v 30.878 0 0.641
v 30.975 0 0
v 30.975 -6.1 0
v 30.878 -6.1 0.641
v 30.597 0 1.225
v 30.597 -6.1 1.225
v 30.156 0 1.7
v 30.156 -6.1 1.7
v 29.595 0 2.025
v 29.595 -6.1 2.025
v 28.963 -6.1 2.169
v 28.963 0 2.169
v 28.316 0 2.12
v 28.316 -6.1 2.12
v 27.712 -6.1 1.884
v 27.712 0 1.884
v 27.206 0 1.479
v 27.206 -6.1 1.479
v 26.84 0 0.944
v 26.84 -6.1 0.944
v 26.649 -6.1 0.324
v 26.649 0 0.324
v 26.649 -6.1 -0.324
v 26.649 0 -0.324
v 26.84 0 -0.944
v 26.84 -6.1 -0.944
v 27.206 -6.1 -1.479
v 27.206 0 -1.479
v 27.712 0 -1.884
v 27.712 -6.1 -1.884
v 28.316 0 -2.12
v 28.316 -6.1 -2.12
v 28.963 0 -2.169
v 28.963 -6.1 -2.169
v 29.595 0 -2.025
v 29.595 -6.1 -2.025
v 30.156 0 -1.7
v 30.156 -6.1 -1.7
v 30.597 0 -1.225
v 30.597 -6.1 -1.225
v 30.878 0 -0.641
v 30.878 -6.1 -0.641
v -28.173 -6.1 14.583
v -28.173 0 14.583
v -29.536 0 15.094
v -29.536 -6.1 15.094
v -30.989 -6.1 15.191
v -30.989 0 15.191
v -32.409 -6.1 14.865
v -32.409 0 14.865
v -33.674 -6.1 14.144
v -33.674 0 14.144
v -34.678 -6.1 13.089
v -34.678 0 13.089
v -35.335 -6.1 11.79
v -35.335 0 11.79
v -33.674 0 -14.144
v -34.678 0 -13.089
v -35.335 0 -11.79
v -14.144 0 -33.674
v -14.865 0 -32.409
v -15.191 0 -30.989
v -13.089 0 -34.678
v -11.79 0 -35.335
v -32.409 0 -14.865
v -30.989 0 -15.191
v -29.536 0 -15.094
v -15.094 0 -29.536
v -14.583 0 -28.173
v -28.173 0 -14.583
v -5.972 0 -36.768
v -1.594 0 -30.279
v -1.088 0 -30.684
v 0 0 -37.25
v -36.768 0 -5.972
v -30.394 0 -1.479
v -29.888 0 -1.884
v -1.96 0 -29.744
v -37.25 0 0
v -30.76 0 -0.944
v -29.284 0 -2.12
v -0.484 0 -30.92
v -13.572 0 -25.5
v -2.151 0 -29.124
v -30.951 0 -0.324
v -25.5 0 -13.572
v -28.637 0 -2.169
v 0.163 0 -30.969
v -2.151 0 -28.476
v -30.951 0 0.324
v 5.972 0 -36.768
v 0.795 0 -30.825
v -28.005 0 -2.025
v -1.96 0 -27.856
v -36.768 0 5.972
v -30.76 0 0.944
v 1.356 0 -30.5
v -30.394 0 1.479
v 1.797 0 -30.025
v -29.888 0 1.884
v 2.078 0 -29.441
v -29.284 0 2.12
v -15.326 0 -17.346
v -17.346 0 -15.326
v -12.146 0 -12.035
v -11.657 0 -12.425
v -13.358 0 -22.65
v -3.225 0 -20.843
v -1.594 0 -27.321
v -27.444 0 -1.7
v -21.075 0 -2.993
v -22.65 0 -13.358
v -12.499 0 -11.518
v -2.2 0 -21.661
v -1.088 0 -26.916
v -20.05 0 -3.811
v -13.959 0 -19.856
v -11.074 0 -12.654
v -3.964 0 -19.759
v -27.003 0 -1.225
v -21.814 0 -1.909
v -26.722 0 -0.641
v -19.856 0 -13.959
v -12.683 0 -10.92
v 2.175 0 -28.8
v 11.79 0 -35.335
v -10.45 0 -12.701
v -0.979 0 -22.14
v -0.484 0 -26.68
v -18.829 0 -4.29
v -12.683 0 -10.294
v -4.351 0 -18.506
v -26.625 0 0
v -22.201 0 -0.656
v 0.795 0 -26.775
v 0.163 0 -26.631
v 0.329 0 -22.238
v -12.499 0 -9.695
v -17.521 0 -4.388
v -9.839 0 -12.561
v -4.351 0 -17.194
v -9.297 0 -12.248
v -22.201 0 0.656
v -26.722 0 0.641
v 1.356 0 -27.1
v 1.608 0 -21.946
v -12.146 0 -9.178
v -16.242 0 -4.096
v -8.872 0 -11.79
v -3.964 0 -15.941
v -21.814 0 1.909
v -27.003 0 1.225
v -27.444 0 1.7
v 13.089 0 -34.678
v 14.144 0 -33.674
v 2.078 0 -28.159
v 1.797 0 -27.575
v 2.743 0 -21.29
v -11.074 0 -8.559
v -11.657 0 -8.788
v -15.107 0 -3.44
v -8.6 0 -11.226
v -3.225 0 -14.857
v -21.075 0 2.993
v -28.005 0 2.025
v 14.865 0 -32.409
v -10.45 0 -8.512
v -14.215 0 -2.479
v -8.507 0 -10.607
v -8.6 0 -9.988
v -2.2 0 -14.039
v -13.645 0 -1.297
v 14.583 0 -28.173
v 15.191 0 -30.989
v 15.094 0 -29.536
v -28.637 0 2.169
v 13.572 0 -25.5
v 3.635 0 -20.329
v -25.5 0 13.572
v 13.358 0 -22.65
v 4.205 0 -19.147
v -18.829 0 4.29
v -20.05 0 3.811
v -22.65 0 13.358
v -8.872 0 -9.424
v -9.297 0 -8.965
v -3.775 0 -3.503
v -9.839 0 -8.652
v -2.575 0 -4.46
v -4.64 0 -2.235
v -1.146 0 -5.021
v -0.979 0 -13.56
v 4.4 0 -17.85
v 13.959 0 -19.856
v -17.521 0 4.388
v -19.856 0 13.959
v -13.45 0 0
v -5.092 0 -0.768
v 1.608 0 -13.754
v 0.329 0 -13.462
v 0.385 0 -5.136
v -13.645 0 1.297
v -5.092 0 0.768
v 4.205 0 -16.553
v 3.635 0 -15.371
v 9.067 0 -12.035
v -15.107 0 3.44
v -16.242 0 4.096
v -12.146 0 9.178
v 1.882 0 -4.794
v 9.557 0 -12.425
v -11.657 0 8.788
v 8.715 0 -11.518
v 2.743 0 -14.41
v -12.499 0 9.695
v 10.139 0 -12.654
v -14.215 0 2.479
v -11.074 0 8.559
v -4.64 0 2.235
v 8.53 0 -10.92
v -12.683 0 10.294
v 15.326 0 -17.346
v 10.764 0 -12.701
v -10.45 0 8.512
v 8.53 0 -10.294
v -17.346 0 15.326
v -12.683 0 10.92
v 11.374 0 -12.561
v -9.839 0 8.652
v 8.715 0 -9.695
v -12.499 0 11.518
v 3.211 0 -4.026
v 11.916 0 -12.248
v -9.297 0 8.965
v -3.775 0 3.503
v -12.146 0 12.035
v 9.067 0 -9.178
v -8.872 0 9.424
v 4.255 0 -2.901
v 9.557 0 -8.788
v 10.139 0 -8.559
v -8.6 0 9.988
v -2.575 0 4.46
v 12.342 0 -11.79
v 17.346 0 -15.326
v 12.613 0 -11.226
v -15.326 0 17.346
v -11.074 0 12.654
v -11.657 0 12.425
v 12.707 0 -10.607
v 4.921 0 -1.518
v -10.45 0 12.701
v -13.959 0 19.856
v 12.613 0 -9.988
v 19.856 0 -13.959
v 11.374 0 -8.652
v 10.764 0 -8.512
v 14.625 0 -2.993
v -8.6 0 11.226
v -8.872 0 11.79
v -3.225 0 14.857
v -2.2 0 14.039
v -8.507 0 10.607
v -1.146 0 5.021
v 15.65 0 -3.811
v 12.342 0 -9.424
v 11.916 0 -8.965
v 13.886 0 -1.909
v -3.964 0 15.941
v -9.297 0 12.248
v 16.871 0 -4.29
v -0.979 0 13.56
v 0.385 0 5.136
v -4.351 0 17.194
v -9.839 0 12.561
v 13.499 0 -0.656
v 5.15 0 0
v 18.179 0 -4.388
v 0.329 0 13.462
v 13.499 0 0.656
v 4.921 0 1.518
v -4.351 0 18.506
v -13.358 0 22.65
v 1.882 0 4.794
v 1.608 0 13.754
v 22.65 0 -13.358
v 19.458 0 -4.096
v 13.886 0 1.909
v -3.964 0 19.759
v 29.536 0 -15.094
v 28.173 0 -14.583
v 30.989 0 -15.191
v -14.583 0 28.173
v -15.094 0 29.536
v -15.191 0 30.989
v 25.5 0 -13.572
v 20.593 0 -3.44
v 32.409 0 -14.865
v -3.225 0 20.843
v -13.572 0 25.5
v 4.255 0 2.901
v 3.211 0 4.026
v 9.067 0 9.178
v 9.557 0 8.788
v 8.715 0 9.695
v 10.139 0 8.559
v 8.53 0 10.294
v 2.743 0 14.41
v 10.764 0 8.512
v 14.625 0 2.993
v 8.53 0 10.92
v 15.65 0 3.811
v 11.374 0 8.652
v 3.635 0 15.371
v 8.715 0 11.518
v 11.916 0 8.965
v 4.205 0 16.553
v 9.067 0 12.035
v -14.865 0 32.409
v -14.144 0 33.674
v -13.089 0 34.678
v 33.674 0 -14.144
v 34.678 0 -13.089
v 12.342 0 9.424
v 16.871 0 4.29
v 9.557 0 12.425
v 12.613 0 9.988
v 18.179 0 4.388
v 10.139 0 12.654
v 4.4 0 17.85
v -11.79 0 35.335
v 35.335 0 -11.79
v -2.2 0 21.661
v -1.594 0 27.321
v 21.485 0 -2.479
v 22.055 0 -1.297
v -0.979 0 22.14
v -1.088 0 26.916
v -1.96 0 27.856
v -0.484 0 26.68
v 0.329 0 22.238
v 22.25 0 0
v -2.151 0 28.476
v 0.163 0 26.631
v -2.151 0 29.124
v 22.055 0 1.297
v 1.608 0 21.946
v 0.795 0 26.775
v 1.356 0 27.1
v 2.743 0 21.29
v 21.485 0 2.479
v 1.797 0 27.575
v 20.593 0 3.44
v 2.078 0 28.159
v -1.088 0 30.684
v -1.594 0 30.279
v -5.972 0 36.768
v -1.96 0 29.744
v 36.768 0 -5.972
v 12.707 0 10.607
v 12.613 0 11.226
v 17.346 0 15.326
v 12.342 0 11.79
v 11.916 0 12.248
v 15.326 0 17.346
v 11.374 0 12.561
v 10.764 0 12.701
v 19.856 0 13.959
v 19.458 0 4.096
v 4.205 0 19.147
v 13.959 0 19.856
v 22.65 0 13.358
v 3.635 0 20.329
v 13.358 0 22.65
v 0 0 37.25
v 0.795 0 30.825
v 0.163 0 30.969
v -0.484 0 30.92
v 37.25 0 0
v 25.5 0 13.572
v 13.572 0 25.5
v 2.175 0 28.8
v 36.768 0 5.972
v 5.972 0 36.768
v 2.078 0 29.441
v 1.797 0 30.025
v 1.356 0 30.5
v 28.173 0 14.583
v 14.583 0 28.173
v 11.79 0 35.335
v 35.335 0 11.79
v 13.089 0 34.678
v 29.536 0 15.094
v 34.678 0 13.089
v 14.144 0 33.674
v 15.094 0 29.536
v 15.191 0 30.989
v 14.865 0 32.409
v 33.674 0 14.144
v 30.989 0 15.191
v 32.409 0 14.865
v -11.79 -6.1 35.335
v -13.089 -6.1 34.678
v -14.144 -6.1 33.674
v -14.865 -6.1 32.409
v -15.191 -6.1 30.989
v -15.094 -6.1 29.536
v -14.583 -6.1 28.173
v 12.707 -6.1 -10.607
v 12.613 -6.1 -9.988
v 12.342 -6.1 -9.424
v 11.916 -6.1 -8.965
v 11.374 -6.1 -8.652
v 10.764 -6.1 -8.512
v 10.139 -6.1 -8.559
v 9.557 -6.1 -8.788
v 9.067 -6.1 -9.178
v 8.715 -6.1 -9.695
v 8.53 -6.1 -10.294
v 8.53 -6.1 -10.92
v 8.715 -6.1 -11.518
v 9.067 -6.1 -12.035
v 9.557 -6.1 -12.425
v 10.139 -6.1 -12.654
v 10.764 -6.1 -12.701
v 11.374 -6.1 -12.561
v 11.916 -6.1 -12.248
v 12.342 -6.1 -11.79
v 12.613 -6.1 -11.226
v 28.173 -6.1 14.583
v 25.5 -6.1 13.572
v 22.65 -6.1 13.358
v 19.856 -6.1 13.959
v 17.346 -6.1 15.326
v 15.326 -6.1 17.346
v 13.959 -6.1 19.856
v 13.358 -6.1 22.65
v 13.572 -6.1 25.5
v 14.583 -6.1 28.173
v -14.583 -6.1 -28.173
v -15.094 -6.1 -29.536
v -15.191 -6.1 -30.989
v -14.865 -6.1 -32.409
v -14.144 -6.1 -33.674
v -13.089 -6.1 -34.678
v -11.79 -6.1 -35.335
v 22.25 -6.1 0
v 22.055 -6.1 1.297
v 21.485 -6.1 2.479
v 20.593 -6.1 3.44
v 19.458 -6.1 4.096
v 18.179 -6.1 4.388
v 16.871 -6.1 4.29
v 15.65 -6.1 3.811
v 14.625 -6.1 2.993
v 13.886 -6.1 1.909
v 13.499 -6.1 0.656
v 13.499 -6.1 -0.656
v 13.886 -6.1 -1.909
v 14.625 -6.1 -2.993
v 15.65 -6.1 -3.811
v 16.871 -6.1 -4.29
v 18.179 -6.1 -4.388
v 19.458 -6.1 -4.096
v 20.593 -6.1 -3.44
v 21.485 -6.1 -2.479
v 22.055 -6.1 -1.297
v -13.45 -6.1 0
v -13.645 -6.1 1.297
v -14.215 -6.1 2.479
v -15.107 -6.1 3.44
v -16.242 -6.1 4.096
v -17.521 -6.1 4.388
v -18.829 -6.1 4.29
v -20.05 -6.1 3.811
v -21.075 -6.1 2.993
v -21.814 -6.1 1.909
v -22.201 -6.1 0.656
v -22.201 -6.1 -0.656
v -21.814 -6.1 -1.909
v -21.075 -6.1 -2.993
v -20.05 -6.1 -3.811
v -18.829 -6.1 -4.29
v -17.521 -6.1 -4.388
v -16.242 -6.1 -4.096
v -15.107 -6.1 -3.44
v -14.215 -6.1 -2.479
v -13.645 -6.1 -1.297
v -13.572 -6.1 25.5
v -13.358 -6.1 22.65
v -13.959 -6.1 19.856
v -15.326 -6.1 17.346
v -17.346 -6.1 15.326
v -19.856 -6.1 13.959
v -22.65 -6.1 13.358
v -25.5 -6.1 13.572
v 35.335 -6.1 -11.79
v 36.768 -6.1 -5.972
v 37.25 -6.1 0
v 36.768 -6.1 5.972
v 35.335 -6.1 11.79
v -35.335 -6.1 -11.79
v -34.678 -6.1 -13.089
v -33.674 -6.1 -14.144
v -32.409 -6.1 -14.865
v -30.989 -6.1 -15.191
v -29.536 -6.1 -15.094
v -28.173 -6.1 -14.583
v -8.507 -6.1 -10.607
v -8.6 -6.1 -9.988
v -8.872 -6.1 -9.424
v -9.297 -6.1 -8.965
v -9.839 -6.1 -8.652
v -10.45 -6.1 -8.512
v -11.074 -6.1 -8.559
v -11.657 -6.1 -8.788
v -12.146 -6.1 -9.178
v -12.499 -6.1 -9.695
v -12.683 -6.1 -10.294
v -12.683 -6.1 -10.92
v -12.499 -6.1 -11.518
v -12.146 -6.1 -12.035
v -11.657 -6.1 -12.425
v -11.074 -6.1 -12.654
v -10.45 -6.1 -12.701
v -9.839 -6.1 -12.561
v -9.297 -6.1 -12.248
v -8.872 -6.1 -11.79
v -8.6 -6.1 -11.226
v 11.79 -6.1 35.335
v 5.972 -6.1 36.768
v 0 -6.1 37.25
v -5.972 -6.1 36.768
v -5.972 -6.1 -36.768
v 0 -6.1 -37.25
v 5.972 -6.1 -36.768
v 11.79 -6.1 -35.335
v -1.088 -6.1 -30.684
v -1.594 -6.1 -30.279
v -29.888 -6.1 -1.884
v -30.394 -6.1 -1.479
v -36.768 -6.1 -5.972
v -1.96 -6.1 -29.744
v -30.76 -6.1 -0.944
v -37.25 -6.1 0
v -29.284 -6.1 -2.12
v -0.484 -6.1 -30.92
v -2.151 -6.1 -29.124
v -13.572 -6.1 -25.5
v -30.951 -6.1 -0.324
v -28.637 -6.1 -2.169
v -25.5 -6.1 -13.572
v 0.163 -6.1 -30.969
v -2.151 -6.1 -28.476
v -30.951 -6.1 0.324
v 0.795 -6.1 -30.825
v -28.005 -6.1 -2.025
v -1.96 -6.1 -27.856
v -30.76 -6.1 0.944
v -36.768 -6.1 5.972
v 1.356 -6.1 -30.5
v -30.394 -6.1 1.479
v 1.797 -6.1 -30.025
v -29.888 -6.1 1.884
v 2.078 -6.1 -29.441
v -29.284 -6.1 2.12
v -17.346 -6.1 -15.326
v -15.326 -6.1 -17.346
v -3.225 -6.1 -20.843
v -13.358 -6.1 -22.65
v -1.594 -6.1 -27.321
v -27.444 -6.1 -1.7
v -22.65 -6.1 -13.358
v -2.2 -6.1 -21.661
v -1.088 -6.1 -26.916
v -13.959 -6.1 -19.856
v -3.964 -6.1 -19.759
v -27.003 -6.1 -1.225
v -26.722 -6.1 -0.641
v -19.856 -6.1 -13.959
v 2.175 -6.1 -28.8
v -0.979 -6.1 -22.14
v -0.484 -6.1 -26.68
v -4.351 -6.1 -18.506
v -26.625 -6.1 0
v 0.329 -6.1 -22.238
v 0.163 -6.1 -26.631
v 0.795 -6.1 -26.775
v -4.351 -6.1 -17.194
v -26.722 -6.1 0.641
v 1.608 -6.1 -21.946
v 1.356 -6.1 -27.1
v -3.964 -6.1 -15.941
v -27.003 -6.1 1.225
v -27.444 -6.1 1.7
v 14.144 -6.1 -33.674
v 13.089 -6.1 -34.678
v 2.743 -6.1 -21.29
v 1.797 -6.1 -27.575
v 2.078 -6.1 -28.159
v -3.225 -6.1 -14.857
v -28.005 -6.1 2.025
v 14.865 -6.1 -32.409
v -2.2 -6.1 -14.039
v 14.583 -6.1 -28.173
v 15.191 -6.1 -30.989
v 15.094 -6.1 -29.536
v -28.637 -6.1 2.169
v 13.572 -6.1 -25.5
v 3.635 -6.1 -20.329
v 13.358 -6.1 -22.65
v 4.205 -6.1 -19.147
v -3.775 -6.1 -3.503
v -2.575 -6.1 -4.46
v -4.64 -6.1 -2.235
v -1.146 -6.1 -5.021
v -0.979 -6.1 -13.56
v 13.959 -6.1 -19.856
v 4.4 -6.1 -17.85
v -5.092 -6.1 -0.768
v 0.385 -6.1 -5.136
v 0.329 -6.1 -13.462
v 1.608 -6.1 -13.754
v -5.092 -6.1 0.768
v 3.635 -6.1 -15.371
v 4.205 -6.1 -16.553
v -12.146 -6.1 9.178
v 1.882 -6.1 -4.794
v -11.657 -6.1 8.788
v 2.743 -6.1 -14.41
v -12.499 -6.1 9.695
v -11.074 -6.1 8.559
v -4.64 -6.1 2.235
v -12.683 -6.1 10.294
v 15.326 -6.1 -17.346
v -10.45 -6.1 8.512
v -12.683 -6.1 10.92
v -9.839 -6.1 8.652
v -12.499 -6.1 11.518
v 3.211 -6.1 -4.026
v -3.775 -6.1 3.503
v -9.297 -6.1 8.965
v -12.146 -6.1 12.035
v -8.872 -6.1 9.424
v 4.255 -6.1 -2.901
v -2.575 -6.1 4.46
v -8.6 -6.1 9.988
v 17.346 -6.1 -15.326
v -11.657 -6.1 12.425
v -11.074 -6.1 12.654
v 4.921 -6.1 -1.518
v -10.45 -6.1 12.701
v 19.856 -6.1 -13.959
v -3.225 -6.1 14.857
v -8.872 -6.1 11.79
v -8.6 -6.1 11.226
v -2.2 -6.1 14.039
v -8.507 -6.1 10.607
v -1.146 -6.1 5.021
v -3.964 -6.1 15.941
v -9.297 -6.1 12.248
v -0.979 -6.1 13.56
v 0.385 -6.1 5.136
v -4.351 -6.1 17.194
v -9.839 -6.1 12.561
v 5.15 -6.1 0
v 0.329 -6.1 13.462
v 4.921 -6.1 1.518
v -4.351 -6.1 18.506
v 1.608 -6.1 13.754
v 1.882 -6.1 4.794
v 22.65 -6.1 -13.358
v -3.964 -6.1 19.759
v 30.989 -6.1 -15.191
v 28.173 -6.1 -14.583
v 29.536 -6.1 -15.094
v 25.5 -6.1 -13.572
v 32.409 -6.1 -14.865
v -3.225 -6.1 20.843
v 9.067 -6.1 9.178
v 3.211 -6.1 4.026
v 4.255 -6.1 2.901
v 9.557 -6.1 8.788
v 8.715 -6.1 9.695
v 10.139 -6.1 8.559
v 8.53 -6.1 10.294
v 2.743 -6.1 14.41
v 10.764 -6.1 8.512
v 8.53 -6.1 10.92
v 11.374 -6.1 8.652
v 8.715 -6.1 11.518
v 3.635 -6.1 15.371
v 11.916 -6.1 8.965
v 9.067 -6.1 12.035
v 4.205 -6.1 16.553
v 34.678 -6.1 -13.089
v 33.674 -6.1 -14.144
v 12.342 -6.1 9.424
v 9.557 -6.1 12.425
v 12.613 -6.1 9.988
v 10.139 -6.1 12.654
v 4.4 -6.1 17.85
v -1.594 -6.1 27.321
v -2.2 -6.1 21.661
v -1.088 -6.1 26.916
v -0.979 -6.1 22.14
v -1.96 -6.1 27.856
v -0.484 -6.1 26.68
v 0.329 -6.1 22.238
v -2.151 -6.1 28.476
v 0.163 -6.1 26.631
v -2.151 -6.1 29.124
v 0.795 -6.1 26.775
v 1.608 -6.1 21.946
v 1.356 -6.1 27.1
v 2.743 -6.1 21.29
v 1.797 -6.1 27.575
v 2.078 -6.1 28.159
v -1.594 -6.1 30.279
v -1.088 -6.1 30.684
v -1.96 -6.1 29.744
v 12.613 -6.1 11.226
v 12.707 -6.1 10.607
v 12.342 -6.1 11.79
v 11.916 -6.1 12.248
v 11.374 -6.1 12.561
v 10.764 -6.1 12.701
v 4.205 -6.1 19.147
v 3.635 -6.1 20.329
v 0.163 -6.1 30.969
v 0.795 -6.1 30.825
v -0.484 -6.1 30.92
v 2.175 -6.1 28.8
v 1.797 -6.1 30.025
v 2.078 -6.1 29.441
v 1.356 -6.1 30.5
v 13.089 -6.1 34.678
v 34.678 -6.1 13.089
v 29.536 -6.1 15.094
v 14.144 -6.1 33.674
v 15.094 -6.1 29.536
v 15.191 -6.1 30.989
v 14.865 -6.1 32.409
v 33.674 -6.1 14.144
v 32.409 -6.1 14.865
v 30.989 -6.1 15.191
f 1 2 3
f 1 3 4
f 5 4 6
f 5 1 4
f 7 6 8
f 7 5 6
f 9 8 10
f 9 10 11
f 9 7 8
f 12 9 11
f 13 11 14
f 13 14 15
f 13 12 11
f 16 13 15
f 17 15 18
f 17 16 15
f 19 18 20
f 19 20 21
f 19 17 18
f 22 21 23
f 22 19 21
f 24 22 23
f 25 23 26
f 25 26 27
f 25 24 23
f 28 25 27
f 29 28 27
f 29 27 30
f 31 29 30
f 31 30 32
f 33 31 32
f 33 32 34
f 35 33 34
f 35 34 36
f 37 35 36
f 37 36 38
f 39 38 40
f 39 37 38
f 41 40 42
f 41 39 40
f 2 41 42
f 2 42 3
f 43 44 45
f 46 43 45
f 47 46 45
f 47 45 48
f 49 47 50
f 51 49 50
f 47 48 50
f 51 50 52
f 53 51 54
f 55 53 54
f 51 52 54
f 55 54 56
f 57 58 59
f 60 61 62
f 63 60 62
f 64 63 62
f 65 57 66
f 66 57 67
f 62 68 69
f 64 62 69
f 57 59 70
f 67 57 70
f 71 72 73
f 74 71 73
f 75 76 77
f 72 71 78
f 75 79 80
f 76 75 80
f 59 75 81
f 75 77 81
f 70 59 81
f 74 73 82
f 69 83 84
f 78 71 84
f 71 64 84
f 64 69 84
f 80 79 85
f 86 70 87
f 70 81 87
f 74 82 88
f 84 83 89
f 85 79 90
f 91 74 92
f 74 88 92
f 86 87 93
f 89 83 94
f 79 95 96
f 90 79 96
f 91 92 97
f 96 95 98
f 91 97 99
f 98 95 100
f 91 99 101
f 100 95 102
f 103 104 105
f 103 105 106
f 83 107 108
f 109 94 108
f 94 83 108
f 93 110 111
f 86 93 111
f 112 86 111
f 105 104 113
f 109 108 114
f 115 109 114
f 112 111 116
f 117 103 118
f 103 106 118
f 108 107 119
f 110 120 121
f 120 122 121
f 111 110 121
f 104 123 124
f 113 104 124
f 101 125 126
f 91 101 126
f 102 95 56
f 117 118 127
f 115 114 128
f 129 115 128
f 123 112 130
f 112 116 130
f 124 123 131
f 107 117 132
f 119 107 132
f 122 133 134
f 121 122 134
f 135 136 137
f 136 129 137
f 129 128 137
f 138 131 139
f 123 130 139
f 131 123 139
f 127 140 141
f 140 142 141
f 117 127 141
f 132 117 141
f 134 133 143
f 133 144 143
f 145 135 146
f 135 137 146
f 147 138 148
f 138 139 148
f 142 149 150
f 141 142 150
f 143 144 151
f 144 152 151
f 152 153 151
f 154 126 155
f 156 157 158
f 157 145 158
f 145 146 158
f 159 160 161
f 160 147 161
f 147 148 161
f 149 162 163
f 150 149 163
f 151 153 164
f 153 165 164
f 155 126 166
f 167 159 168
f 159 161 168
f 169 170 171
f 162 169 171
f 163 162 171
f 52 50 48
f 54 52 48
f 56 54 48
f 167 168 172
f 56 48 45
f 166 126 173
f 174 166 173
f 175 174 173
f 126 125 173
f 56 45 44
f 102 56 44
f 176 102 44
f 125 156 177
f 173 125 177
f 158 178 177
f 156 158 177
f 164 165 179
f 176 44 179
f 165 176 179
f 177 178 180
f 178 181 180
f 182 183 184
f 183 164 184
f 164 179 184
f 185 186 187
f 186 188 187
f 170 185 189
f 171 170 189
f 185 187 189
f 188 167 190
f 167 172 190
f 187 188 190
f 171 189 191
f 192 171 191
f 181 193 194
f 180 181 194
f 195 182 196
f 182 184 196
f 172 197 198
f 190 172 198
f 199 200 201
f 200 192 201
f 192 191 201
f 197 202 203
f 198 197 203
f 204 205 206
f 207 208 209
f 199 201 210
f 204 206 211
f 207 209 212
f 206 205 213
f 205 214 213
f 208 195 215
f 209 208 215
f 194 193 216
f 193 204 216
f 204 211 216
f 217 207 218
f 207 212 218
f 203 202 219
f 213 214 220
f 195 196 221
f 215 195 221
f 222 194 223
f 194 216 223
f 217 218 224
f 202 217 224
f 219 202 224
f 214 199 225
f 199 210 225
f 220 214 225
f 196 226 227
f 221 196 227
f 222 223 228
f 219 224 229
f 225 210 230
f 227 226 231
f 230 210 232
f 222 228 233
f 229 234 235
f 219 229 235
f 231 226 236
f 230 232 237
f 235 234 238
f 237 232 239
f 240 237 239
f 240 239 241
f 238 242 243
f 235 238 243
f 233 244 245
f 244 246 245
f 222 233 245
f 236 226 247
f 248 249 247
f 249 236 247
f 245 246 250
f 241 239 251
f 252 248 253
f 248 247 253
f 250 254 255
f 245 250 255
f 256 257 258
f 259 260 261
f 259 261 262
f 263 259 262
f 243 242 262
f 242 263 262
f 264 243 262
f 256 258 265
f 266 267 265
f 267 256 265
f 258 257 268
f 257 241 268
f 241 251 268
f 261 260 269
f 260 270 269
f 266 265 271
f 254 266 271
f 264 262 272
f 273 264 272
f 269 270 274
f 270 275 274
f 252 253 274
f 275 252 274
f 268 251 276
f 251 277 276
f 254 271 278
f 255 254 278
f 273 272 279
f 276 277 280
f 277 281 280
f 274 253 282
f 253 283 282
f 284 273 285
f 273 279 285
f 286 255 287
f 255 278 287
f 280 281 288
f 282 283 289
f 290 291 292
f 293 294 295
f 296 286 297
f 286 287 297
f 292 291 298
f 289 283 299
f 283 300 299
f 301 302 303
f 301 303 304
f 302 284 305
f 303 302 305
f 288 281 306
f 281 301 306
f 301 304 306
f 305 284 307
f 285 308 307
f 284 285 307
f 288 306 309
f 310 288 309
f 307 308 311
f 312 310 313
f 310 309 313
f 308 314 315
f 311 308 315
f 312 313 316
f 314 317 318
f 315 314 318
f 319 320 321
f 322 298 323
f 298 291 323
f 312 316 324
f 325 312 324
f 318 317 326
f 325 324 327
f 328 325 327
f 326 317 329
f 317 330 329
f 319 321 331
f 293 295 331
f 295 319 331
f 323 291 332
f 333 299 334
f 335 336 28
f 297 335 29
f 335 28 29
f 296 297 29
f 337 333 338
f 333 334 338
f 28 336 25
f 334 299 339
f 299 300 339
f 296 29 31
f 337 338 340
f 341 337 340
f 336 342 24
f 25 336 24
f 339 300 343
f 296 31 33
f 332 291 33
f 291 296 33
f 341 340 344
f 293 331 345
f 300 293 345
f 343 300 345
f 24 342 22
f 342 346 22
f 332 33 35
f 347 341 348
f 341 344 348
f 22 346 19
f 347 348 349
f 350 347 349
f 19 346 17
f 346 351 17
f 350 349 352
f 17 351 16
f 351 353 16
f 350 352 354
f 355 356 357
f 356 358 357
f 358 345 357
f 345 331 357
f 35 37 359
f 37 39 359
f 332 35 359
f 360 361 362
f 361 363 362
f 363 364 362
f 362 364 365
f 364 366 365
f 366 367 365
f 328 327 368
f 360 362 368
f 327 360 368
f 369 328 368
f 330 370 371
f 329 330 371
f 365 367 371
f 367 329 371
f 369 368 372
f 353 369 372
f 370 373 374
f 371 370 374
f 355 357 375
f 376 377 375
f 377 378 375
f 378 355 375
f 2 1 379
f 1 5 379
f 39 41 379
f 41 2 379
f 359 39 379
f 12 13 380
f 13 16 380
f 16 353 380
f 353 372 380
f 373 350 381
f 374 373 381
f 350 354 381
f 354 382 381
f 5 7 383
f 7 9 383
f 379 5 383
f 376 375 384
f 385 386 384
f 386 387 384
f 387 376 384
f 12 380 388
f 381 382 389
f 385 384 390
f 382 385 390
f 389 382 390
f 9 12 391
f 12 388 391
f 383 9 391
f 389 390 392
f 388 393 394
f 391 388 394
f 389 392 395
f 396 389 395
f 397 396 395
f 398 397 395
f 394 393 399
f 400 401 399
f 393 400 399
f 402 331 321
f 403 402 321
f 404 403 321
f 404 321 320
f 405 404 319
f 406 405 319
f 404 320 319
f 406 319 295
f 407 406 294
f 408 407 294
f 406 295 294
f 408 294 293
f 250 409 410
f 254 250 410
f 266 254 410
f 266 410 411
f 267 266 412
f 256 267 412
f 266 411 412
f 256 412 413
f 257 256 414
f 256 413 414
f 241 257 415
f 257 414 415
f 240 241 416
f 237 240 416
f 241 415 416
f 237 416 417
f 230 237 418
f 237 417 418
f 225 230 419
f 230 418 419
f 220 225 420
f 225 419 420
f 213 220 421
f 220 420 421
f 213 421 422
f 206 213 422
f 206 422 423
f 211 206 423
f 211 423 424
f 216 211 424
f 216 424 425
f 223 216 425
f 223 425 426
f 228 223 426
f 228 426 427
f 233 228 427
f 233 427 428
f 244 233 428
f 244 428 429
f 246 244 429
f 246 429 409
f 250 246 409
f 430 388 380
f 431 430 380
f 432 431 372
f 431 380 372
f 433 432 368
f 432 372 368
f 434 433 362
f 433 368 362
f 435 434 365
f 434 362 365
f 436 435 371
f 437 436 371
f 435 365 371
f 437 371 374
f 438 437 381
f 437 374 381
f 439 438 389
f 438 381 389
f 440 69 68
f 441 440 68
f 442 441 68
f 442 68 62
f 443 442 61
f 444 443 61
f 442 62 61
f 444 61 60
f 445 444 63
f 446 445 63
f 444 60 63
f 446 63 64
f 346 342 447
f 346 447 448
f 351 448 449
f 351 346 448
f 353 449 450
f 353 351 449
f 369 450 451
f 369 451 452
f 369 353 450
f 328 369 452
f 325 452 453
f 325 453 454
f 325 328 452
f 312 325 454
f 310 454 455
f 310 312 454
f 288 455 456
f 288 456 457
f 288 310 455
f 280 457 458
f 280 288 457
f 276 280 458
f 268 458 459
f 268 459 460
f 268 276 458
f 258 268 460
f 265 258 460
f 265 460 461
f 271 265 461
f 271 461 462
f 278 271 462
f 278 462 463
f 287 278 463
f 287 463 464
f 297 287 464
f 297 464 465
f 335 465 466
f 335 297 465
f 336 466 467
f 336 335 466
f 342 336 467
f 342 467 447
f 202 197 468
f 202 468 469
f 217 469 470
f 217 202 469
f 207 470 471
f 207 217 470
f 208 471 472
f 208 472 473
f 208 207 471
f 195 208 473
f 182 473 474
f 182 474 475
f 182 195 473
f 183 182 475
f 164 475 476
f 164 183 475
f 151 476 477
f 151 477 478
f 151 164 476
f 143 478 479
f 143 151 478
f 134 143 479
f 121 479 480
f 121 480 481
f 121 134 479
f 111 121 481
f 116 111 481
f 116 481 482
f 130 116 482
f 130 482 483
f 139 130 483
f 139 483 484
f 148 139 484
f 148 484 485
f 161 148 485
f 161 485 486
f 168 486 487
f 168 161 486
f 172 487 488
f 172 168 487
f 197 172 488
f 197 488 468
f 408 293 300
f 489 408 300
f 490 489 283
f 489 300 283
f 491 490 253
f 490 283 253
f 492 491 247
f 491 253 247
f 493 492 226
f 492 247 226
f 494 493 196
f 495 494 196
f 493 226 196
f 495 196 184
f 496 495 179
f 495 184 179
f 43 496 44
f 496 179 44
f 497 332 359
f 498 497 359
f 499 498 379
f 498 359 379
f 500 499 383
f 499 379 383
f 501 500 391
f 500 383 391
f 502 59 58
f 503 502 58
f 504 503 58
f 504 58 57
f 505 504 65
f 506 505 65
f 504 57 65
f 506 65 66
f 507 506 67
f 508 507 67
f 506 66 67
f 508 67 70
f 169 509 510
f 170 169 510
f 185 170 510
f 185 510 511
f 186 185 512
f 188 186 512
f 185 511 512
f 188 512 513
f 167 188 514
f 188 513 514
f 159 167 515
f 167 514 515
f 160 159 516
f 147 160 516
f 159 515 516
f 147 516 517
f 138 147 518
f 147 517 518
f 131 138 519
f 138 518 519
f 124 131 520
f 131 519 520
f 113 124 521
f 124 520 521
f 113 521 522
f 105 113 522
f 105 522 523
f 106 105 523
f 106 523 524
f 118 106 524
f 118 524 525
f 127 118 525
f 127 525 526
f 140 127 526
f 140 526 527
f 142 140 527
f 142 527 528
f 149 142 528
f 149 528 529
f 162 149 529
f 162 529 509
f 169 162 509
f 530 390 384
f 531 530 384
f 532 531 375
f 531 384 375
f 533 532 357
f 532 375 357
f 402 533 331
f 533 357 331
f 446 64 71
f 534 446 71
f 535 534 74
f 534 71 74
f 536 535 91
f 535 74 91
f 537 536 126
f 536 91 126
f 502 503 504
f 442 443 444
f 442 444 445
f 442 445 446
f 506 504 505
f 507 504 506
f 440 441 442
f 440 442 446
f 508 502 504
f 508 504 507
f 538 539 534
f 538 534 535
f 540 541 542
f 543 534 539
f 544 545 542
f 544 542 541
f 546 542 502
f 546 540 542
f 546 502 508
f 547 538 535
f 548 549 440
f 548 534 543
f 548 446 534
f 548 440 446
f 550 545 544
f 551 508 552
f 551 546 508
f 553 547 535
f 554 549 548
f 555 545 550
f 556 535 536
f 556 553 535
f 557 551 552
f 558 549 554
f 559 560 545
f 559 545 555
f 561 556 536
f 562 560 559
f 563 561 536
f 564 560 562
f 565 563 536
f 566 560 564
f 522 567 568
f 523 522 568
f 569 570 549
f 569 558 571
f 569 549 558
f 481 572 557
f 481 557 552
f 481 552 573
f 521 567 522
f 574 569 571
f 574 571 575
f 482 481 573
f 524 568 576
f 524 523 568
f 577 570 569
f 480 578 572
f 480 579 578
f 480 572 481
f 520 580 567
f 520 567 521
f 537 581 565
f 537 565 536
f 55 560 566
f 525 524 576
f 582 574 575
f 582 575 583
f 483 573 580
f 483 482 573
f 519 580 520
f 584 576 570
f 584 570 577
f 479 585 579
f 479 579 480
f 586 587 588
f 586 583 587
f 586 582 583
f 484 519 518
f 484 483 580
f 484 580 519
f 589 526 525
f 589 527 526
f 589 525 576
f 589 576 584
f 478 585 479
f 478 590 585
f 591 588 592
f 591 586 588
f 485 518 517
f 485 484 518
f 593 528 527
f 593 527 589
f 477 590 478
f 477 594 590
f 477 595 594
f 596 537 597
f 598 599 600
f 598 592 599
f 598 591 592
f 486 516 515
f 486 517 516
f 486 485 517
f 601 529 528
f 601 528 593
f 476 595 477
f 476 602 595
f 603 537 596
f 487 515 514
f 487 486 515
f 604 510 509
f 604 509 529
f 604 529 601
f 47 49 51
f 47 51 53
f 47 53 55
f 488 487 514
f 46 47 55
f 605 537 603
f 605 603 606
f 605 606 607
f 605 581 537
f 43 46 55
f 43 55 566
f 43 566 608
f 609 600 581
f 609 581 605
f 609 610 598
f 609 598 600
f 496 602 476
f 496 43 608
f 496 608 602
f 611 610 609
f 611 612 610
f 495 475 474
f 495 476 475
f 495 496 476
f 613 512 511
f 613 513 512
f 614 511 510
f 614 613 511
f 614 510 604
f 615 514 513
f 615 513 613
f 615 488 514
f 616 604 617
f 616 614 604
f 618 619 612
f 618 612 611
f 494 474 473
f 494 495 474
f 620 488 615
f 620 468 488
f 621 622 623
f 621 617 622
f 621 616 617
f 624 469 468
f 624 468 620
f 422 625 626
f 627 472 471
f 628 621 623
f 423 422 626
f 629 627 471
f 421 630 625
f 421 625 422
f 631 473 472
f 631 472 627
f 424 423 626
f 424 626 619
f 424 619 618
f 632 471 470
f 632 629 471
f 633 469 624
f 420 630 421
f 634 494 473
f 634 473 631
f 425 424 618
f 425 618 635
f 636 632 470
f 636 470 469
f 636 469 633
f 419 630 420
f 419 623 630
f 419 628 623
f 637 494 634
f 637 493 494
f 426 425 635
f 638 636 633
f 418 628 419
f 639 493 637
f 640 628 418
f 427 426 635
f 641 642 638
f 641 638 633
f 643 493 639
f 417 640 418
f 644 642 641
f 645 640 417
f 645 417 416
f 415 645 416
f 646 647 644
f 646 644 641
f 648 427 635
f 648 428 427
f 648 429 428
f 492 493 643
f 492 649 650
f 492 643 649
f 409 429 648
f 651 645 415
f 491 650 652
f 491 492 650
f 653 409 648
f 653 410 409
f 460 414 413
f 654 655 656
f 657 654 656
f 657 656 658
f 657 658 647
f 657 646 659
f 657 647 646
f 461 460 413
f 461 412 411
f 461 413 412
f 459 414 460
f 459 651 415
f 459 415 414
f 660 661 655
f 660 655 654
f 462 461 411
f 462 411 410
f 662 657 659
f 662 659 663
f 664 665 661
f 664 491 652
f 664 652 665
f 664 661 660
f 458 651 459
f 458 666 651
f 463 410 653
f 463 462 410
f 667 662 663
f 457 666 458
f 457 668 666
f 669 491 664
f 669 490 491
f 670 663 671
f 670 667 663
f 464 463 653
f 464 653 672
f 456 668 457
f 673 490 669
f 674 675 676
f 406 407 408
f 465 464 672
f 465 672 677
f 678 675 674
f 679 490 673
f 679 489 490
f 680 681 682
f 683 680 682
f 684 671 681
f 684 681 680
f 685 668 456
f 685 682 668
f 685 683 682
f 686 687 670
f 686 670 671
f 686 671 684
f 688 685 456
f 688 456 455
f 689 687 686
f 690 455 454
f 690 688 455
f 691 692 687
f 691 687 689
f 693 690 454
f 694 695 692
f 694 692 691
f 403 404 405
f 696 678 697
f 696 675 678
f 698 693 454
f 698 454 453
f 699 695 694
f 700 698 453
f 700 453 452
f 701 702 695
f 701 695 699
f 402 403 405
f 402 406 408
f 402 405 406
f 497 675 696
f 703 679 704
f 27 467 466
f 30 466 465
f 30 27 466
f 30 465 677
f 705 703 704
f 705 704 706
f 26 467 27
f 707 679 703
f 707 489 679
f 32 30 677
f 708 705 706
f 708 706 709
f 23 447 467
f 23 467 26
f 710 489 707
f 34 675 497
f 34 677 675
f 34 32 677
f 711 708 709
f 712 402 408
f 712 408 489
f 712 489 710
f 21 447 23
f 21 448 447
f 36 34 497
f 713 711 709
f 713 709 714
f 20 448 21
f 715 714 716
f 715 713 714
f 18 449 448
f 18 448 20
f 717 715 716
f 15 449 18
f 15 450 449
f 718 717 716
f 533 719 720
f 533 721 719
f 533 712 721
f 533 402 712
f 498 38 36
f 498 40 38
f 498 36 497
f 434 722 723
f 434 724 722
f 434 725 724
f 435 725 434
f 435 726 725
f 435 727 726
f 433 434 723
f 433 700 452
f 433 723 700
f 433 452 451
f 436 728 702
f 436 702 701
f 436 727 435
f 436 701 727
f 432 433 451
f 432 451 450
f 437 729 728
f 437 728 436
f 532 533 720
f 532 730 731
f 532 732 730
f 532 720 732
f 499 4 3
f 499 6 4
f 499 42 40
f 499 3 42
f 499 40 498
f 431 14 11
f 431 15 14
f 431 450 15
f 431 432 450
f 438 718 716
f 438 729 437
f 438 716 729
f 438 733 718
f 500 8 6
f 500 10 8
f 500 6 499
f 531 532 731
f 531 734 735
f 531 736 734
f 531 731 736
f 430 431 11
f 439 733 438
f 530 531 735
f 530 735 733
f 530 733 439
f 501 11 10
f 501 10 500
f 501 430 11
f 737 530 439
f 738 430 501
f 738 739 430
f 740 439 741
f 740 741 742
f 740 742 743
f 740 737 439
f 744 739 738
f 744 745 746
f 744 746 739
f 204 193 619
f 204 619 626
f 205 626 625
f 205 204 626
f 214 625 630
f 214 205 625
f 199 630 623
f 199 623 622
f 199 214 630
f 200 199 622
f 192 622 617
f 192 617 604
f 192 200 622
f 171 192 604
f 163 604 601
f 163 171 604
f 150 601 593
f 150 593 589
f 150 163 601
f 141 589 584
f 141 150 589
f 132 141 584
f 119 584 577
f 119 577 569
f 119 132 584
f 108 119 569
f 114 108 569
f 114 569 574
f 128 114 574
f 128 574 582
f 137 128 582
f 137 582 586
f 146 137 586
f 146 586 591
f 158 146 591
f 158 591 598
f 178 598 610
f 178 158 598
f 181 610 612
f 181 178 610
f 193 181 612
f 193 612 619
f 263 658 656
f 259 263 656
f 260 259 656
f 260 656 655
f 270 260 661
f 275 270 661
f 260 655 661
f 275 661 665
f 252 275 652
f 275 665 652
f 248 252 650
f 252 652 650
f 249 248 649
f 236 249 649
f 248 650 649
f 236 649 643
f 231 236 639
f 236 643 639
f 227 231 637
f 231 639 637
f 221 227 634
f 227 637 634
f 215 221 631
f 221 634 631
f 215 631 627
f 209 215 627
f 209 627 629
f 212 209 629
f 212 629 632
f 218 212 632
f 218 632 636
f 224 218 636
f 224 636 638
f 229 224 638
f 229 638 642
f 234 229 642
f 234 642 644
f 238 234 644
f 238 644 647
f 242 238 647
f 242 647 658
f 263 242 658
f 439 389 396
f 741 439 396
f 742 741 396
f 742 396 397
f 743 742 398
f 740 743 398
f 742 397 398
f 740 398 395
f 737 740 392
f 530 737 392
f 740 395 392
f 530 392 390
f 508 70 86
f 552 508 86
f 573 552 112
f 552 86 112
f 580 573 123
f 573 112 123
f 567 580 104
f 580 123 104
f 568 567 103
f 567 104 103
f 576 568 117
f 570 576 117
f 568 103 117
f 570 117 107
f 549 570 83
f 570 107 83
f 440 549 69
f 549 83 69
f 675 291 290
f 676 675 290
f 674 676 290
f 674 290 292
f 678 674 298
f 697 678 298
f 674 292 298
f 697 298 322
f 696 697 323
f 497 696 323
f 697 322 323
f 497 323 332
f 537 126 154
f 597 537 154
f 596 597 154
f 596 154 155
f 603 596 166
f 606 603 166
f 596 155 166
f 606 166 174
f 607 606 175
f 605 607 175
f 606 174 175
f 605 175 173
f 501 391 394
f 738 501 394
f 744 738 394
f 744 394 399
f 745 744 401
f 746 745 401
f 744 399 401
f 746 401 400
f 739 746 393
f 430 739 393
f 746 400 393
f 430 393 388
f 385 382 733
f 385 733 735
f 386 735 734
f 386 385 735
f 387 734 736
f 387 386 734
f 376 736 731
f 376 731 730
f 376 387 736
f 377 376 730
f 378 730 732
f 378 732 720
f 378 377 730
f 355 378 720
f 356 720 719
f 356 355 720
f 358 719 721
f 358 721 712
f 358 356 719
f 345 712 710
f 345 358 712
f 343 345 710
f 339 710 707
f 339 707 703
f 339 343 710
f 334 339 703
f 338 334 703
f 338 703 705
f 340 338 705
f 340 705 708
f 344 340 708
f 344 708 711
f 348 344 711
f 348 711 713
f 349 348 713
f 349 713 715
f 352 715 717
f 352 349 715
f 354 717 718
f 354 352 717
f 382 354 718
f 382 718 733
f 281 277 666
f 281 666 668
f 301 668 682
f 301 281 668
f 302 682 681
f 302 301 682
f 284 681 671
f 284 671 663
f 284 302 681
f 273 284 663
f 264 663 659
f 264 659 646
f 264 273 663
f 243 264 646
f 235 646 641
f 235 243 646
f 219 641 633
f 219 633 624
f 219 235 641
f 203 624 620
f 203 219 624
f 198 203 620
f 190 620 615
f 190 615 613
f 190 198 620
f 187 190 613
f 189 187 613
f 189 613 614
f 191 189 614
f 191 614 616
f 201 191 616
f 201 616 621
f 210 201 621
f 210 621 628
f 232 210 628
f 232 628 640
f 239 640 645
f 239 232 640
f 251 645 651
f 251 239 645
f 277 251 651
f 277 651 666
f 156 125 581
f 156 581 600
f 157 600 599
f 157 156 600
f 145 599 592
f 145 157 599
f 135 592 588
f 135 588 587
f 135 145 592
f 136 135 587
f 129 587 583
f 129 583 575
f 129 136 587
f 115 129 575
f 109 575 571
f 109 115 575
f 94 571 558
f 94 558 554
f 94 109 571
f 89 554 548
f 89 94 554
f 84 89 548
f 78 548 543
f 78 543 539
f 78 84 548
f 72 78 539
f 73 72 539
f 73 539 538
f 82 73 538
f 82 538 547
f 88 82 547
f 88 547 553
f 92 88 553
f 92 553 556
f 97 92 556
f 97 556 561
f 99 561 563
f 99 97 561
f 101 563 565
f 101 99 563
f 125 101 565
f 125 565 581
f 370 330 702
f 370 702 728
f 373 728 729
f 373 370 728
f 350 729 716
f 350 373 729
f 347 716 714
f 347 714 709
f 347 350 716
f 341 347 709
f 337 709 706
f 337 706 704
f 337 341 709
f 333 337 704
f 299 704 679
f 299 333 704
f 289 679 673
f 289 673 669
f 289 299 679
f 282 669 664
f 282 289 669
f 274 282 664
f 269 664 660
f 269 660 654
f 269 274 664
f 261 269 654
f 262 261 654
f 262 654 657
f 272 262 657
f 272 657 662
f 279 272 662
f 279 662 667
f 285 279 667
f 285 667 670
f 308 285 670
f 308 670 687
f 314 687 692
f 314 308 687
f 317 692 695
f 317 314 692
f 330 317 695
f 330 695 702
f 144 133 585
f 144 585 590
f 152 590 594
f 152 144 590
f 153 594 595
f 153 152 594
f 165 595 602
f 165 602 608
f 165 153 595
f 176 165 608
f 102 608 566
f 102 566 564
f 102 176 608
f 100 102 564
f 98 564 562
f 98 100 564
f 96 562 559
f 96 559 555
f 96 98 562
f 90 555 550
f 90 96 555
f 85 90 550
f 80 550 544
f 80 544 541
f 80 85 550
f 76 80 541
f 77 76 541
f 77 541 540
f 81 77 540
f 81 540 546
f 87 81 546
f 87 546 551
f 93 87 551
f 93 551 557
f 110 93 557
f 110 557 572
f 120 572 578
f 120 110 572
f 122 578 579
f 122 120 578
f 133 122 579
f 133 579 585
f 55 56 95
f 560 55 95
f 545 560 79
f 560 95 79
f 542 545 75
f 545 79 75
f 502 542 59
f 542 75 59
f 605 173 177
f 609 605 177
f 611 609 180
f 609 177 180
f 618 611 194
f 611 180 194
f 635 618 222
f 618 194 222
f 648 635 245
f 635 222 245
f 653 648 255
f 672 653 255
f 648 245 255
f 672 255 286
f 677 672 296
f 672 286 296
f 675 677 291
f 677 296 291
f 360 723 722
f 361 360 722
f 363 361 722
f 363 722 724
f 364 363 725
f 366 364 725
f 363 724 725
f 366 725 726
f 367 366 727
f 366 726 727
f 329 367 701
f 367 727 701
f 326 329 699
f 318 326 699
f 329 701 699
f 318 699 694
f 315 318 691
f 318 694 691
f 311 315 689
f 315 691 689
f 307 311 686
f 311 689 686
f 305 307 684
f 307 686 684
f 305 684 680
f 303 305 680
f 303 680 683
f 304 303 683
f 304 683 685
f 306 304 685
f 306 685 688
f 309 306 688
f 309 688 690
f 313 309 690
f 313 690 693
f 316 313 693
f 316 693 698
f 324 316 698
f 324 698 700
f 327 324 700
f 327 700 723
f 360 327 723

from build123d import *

# Parameters (mm, degrees)
F0_R     = 2.175
F0_R_2   = 4.4
F0_R_3   = 5.15
F1_DEPTH = 6.1
F2_R     = 2.1
F3_DEPTH = 6.101


with BuildPart() as f1:
    # F0 (on Front) → F1 (new body)
    with BuildSketch(Plane.XZ):
        with BuildLine():
            ThreePointArc((-28.172905, 14.582949), (-32.408847, 14.865425), (-35.335057, 11.789667))
            ThreePointArc((-35.335057, 11.789667), (-37.25, 0), (-35.335057, -11.789667))
            ThreePointArc((-35.335057, -11.789667), (-32.408847, -14.865425), (-28.172905, -14.582949))
            ThreePointArc((-28.172905, -14.582949), (-16.263456, -16.263456), (-14.582949, -28.172905))
            ThreePointArc((-14.582949, -28.172905), (-14.865425, -32.408847), (-11.789667, -35.335057))
            ThreePointArc((-11.789667, -35.335057), (0, -37.25), (11.789667, -35.335057))
            ThreePointArc((11.789667, -35.335057), (14.865425, -32.408847), (14.582949, -28.172905))
            ThreePointArc((14.582949, -28.172905), (16.263456, -16.263456), (28.172905, -14.582949))
            ThreePointArc((28.172905, -14.582949), (32.408847, -14.865425), (35.335057, -11.789667))
            ThreePointArc((35.335057, -11.789667), (37.25, 0), (35.335057, 11.789667))
            ThreePointArc((35.335057, 11.789667), (32.408847, 14.865425), (28.172905, 14.582949))
            ThreePointArc((28.172905, 14.582949), (16.263456, 16.263456), (14.582949, 28.172905))
            ThreePointArc((14.582949, 28.172905), (14.865425, 32.408847), (11.789667, 35.335057))
            ThreePointArc((11.789667, 35.335057), (0, 37.25), (-11.789667, 35.335057))
            ThreePointArc((-11.789667, 35.335057), (-14.865425, 32.408847), (-14.582949, 28.172905))
            ThreePointArc((-14.582949, 28.172905), (-16.263456, 16.263456), (-28.172905, 14.582949))
        make_face()
        with Locations((0, -28.8)):
            Circle(F0_R, mode=Mode.SUBTRACT)
        with Locations((0, -17.85)):
            Circle(F0_R_2, mode=Mode.SUBTRACT)
        with Locations((-28.8, 0)):
            Circle(F0_R, mode=Mode.SUBTRACT)
        with Locations((-17.85, 0)):
            Circle(F0_R_2, mode=Mode.SUBTRACT)
        Circle(F0_R_3, mode=Mode.SUBTRACT)
        with Locations((0, 17.85)):
            Circle(F0_R_2, mode=Mode.SUBTRACT)
        with Locations((0, 28.8)):
            Circle(F0_R, mode=Mode.SUBTRACT)
        with Locations((17.85, 0)):
            Circle(F0_R_2, mode=Mode.SUBTRACT)
        with Locations((28.8, 0)):
            Circle(F0_R, mode=Mode.SUBTRACT)
    extrude(amount=F1_DEPTH)

    # F2 (on face) → F3 (cut, through all)
    with BuildSketch(Plane.XZ.offset(6.1)):
        with Locations((-10.606602, 10.606602)):
            Circle(F2_R)
        with Locations((-10.606602, -10.606602)):
            Circle(F2_R)
        with Locations((10.606602, -10.606602)):
            Circle(F2_R)
        with Locations((10.606602, 10.606602)):
            Circle(F2_R)
    extrude(amount=-F3_DEPTH, mode=Mode.SUBTRACT)


solid = f1.part
